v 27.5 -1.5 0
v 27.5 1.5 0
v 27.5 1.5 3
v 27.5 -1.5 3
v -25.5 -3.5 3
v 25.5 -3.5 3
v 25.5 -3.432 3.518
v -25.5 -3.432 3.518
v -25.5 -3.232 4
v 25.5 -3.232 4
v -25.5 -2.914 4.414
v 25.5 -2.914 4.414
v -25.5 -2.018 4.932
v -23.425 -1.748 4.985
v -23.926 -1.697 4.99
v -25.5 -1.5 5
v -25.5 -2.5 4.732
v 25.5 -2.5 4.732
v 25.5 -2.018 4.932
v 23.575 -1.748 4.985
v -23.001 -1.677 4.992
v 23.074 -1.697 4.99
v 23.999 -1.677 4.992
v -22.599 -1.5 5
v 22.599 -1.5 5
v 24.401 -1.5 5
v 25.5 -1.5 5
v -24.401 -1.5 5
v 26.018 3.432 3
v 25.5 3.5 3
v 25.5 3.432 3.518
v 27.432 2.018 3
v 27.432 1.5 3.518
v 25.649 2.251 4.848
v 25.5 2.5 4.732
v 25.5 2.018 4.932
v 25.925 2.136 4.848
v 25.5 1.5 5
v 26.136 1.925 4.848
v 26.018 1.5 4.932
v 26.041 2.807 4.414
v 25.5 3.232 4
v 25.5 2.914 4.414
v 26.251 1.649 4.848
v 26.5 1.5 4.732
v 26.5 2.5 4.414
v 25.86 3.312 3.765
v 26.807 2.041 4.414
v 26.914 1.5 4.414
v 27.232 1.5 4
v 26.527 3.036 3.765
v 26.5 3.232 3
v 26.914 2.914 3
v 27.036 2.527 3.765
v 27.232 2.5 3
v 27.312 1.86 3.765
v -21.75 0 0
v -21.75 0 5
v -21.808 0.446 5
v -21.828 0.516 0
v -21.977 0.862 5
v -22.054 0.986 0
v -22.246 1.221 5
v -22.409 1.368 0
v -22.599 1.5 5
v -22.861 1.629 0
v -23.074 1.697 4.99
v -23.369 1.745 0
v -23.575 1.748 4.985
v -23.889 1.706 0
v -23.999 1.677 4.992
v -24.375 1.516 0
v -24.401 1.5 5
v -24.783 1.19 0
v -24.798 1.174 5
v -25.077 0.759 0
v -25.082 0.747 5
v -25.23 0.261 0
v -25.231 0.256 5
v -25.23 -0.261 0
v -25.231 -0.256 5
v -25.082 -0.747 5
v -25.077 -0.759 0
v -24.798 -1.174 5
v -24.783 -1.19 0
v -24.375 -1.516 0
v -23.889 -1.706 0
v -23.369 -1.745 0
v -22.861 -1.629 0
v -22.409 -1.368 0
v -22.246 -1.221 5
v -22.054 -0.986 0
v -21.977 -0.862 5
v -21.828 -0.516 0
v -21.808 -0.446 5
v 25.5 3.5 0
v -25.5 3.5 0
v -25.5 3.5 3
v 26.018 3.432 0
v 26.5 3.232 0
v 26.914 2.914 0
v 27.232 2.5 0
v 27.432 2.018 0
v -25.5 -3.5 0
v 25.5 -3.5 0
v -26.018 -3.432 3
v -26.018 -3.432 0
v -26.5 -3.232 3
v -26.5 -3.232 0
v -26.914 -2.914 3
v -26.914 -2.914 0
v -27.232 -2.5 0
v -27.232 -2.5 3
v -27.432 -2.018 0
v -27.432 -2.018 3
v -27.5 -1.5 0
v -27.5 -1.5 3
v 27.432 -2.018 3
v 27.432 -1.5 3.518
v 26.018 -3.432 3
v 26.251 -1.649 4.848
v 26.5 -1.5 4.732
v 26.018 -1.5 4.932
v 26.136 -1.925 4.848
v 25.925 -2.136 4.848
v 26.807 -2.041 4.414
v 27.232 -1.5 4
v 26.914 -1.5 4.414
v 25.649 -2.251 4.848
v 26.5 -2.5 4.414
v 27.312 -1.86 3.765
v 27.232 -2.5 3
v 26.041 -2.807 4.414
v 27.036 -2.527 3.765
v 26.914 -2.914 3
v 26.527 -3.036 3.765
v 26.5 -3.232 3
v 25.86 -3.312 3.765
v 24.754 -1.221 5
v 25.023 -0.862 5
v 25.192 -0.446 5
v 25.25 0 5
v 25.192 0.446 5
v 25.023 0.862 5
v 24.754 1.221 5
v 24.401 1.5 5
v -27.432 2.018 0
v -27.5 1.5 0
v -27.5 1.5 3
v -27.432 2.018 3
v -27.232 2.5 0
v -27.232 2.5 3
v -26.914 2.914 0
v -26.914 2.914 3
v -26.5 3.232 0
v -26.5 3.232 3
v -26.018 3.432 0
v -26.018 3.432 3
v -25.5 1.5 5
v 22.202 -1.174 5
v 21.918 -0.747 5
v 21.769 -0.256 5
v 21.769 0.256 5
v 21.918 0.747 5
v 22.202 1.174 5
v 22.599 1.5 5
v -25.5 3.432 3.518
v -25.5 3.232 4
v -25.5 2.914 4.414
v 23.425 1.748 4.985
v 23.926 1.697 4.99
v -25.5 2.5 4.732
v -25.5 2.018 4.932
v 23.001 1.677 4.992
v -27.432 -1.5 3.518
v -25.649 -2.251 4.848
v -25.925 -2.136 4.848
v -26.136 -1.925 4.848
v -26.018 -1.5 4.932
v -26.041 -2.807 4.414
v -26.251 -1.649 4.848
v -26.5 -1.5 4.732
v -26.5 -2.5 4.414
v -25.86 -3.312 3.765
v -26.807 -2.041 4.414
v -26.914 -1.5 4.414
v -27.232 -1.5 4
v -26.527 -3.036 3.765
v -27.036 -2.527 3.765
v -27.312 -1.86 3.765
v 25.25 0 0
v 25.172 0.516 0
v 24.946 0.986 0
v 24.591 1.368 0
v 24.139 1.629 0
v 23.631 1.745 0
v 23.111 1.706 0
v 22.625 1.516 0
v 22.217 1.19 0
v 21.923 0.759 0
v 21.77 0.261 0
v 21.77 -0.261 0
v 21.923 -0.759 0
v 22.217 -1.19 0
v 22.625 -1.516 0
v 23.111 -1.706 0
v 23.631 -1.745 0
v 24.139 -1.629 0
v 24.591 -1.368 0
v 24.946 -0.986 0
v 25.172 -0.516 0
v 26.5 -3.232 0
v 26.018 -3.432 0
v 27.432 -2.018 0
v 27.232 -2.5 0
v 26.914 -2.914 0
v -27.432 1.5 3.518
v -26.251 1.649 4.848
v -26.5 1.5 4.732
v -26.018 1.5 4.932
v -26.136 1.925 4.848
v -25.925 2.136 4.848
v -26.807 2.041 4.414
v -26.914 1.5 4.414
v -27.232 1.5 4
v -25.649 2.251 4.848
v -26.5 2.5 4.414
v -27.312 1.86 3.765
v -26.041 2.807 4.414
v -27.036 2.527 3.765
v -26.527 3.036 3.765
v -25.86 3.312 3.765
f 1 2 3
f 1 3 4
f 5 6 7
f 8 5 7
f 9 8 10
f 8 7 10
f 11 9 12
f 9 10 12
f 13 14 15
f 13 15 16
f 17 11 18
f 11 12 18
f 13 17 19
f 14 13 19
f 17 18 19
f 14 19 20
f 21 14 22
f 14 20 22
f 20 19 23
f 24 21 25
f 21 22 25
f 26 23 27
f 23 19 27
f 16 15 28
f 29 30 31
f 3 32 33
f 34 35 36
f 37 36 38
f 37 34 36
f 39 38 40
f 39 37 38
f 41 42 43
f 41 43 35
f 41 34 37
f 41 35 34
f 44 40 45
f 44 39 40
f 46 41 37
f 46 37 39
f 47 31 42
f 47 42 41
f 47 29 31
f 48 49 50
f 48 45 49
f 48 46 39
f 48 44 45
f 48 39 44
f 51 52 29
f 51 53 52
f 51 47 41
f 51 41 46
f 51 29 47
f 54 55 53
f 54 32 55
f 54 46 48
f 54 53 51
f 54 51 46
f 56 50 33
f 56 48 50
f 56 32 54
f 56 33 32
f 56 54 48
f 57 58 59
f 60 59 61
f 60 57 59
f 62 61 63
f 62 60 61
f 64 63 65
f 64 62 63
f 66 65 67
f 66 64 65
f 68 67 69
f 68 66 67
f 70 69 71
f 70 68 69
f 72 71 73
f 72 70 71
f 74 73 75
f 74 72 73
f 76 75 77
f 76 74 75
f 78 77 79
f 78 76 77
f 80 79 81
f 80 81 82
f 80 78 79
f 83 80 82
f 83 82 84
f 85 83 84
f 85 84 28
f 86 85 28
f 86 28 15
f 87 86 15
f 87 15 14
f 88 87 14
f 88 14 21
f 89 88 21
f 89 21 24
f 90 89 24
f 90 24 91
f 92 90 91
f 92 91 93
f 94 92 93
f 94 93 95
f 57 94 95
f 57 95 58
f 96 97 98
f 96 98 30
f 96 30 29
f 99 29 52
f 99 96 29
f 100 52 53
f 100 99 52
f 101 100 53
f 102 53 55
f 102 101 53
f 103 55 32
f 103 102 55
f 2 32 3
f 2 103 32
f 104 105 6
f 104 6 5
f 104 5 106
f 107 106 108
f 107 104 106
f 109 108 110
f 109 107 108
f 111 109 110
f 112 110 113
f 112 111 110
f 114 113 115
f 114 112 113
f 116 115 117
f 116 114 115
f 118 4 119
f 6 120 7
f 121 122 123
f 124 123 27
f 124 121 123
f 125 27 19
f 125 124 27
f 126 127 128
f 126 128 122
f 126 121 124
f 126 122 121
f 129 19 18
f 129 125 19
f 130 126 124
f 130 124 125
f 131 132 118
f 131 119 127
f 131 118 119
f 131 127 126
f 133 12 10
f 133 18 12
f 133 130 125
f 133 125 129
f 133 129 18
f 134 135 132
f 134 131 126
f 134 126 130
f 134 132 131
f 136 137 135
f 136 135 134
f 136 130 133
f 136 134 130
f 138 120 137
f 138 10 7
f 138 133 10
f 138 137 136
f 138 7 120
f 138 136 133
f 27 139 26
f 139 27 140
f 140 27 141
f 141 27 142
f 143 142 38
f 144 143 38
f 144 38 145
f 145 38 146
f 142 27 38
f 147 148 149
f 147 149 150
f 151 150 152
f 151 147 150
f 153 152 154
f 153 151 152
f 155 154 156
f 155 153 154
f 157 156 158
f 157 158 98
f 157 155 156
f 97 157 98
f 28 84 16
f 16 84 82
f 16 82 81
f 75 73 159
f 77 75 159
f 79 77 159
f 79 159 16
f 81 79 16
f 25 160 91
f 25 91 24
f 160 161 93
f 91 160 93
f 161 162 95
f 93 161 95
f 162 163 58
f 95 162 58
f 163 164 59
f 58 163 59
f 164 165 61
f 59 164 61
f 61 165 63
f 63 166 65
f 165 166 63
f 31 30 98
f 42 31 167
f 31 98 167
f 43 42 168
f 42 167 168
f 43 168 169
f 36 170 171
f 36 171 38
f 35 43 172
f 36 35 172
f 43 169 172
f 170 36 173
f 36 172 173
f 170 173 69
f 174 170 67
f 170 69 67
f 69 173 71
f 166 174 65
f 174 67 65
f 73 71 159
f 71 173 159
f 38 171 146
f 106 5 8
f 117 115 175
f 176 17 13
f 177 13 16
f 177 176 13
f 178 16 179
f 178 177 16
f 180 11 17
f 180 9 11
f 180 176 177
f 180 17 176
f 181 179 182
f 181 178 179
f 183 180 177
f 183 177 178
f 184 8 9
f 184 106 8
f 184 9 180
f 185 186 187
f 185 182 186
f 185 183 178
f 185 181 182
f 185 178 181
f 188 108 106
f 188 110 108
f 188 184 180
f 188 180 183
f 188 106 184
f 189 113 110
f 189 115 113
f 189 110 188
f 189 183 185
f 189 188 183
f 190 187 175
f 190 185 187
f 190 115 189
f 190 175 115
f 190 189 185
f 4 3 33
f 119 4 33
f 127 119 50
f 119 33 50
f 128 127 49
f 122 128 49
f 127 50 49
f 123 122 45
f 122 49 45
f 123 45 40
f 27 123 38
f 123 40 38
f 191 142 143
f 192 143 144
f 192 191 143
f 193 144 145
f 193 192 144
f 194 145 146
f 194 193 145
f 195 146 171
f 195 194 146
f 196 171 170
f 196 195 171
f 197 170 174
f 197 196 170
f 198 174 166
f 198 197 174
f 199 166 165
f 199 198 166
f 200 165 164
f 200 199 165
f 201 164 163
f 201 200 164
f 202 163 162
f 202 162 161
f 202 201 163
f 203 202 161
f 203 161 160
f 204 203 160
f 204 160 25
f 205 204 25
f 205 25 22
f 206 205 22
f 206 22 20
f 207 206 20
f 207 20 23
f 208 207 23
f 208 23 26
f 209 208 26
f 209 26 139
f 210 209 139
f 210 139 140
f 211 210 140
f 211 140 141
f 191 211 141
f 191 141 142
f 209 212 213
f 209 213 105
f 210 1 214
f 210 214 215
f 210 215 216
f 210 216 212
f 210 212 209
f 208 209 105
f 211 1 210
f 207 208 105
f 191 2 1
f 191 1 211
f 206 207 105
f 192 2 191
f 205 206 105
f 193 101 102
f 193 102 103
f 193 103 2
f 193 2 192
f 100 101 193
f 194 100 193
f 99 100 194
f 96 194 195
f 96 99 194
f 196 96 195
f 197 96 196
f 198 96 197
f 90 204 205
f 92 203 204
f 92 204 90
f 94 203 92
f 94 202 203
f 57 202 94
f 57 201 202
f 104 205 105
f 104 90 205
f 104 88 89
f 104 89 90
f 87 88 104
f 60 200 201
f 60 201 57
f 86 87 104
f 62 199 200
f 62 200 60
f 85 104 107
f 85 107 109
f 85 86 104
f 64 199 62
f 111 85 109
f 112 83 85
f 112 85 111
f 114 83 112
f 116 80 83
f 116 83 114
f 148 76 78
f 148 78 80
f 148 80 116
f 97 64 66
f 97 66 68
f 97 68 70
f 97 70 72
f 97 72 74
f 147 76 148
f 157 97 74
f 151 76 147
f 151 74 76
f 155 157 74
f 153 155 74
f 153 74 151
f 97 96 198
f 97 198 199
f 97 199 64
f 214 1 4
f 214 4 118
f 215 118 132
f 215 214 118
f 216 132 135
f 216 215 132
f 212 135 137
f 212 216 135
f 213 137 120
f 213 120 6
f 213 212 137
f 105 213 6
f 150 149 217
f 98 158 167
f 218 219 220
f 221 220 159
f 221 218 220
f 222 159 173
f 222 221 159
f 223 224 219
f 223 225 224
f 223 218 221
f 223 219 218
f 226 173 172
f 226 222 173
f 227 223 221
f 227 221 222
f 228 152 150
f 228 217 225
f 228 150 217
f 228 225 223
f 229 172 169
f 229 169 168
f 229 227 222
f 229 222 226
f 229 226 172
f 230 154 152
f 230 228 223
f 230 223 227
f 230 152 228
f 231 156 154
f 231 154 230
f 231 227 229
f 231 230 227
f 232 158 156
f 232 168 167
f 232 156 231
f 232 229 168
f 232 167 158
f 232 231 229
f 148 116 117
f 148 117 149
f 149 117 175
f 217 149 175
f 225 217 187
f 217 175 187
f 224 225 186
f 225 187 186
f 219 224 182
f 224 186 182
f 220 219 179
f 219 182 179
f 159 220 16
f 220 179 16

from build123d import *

# Parameters (mm, degrees)
SKETCH1_R           = 1.75
BOSS_EXTRUDE1_DEPTH = 5
FILLET1_R           = 2


with BuildPart() as part:
    # Sketch1 → Boss-Extrude1 (new body)
    with BuildSketch(Plane.XY):
        with BuildLine():
            Line((-25.5, 3.5), (25.5, 3.5))
            ThreePointArc((25.5, 3.5), (26.914213562, 2.914213562), (27.5, 1.5))
            Line((27.5, 1.5), (27.5, -1.5))
            ThreePointArc((27.5, -1.5), (26.914213562, -2.914213562), (25.5, -3.5))
            Line((25.5, -3.5), (-25.5, -3.5))
            ThreePointArc((-25.5, -3.5), (-26.914213562, -2.914213562), (-27.5, -1.5))
            Line((-27.5, -1.5), (-27.5, 1.5))
            ThreePointArc((-27.5, 1.5), (-26.914213562, 2.914213562), (-25.5, 3.5))
        make_face()
        with Locations((-23.5, 0)):
            Circle(SKETCH1_R, mode=Mode.SUBTRACT)
        with Locations((23.5, 0)):
            Circle(SKETCH1_R, mode=Mode.SUBTRACT)
    extrude(amount=BOSS_EXTRUDE1_DEPTH)

    # Fillet1
    # the kernel refuses this fillet: 2 mm, written as the material it takes off along each edge
    with BuildSketch(Plane(origin=(-25.5, 1.5, 5), x_dir=(-1, 0, 0), z_dir=(0, -1, 0))) as fillet1_piece_1:
        with BuildLine():
            CenterArc((2 - FILLET1_R, FILLET1_R), FILLET1_R, 270, 90)
            Line((2 - FILLET1_R, 0), (2, 0))
            Line((2, 0), (2, FILLET1_R))
        make_face()
    revolve(axis=Axis((-25.5, 1.5, 5), (0, 0, -1)), revolution_arc=90, mode=Mode.SUBTRACT)
    with BuildSketch(Plane(origin=(-27.5, -1.5, 5), x_dir=(0, 0, -1), z_dir=(0, 1, 0)), Plane(origin=(27.5, 1.5, 5), x_dir=(0, 0, -1), z_dir=(0, -1, 0))) as fillet1_piece_2:
        with BuildLine():
            CenterArc((FILLET1_R, -FILLET1_R), FILLET1_R, 90, 90)
            Line((0, -FILLET1_R), (0, 0))
            Line((0, 0), (FILLET1_R, 0))
        make_face()
    extrude(amount=3, mode=Mode.SUBTRACT)
    with BuildSketch(Plane(origin=(-25.5, -1.5, 5), x_dir=(0, -1, 0), z_dir=(1, 0, 0))) as fillet1_piece_3:
        with BuildLine():
            CenterArc((2 - FILLET1_R, FILLET1_R), FILLET1_R, 270, 90)
            Line((2 - FILLET1_R, 0), (2, 0))
            Line((2, 0), (2, FILLET1_R))
        make_face()
    revolve(axis=Axis((-25.5, -1.5, 5), (0, 0, -1)), revolution_arc=90, mode=Mode.SUBTRACT)
    with BuildSketch(Plane(origin=(25.5, -3.5, 5), x_dir=(0, 0, -1), z_dir=(-1, 0, 0)), Plane(origin=(-25.5, 3.5, 5), x_dir=(0, 0, -1), z_dir=(1, 0, 0))) as fillet1_piece_4:
        with BuildLine():
            CenterArc((FILLET1_R, -FILLET1_R), FILLET1_R, 90, 90)
            Line((0, -FILLET1_R), (0, 0))
            Line((0, 0), (FILLET1_R, 0))
        make_face()
    extrude(amount=51, mode=Mode.SUBTRACT)
    with BuildSketch(Plane(origin=(25.5, -1.5, 5), x_dir=(1, 0, 0), z_dir=(0, 1, 0))) as fillet1_piece_5:
        with BuildLine():
            CenterArc((2 - FILLET1_R, FILLET1_R), FILLET1_R, 270, 90)
            Line((2 - FILLET1_R, 0), (2, 0))
            Line((2, 0), (2, FILLET1_R))
        make_face()
    revolve(axis=Axis((25.5, -1.5, 5), (0, 0, -1)), revolution_arc=90, mode=Mode.SUBTRACT)
    with BuildSketch(Plane(origin=(25.5, 1.5, 5), x_dir=(0, 1, 0), z_dir=(-1, 0, 0))) as fillet1_piece_6:
        with BuildLine():
            CenterArc((2 - FILLET1_R, FILLET1_R), FILLET1_R, 270, 90)
            Line((2 - FILLET1_R, 0), (2, 0))
            Line((2, 0), (2, FILLET1_R))
        make_face()
    revolve(axis=Axis((25.5, 1.5, 5), (0, 0, -1)), revolution_arc=90, mode=Mode.SUBTRACT)


solid = part.part
